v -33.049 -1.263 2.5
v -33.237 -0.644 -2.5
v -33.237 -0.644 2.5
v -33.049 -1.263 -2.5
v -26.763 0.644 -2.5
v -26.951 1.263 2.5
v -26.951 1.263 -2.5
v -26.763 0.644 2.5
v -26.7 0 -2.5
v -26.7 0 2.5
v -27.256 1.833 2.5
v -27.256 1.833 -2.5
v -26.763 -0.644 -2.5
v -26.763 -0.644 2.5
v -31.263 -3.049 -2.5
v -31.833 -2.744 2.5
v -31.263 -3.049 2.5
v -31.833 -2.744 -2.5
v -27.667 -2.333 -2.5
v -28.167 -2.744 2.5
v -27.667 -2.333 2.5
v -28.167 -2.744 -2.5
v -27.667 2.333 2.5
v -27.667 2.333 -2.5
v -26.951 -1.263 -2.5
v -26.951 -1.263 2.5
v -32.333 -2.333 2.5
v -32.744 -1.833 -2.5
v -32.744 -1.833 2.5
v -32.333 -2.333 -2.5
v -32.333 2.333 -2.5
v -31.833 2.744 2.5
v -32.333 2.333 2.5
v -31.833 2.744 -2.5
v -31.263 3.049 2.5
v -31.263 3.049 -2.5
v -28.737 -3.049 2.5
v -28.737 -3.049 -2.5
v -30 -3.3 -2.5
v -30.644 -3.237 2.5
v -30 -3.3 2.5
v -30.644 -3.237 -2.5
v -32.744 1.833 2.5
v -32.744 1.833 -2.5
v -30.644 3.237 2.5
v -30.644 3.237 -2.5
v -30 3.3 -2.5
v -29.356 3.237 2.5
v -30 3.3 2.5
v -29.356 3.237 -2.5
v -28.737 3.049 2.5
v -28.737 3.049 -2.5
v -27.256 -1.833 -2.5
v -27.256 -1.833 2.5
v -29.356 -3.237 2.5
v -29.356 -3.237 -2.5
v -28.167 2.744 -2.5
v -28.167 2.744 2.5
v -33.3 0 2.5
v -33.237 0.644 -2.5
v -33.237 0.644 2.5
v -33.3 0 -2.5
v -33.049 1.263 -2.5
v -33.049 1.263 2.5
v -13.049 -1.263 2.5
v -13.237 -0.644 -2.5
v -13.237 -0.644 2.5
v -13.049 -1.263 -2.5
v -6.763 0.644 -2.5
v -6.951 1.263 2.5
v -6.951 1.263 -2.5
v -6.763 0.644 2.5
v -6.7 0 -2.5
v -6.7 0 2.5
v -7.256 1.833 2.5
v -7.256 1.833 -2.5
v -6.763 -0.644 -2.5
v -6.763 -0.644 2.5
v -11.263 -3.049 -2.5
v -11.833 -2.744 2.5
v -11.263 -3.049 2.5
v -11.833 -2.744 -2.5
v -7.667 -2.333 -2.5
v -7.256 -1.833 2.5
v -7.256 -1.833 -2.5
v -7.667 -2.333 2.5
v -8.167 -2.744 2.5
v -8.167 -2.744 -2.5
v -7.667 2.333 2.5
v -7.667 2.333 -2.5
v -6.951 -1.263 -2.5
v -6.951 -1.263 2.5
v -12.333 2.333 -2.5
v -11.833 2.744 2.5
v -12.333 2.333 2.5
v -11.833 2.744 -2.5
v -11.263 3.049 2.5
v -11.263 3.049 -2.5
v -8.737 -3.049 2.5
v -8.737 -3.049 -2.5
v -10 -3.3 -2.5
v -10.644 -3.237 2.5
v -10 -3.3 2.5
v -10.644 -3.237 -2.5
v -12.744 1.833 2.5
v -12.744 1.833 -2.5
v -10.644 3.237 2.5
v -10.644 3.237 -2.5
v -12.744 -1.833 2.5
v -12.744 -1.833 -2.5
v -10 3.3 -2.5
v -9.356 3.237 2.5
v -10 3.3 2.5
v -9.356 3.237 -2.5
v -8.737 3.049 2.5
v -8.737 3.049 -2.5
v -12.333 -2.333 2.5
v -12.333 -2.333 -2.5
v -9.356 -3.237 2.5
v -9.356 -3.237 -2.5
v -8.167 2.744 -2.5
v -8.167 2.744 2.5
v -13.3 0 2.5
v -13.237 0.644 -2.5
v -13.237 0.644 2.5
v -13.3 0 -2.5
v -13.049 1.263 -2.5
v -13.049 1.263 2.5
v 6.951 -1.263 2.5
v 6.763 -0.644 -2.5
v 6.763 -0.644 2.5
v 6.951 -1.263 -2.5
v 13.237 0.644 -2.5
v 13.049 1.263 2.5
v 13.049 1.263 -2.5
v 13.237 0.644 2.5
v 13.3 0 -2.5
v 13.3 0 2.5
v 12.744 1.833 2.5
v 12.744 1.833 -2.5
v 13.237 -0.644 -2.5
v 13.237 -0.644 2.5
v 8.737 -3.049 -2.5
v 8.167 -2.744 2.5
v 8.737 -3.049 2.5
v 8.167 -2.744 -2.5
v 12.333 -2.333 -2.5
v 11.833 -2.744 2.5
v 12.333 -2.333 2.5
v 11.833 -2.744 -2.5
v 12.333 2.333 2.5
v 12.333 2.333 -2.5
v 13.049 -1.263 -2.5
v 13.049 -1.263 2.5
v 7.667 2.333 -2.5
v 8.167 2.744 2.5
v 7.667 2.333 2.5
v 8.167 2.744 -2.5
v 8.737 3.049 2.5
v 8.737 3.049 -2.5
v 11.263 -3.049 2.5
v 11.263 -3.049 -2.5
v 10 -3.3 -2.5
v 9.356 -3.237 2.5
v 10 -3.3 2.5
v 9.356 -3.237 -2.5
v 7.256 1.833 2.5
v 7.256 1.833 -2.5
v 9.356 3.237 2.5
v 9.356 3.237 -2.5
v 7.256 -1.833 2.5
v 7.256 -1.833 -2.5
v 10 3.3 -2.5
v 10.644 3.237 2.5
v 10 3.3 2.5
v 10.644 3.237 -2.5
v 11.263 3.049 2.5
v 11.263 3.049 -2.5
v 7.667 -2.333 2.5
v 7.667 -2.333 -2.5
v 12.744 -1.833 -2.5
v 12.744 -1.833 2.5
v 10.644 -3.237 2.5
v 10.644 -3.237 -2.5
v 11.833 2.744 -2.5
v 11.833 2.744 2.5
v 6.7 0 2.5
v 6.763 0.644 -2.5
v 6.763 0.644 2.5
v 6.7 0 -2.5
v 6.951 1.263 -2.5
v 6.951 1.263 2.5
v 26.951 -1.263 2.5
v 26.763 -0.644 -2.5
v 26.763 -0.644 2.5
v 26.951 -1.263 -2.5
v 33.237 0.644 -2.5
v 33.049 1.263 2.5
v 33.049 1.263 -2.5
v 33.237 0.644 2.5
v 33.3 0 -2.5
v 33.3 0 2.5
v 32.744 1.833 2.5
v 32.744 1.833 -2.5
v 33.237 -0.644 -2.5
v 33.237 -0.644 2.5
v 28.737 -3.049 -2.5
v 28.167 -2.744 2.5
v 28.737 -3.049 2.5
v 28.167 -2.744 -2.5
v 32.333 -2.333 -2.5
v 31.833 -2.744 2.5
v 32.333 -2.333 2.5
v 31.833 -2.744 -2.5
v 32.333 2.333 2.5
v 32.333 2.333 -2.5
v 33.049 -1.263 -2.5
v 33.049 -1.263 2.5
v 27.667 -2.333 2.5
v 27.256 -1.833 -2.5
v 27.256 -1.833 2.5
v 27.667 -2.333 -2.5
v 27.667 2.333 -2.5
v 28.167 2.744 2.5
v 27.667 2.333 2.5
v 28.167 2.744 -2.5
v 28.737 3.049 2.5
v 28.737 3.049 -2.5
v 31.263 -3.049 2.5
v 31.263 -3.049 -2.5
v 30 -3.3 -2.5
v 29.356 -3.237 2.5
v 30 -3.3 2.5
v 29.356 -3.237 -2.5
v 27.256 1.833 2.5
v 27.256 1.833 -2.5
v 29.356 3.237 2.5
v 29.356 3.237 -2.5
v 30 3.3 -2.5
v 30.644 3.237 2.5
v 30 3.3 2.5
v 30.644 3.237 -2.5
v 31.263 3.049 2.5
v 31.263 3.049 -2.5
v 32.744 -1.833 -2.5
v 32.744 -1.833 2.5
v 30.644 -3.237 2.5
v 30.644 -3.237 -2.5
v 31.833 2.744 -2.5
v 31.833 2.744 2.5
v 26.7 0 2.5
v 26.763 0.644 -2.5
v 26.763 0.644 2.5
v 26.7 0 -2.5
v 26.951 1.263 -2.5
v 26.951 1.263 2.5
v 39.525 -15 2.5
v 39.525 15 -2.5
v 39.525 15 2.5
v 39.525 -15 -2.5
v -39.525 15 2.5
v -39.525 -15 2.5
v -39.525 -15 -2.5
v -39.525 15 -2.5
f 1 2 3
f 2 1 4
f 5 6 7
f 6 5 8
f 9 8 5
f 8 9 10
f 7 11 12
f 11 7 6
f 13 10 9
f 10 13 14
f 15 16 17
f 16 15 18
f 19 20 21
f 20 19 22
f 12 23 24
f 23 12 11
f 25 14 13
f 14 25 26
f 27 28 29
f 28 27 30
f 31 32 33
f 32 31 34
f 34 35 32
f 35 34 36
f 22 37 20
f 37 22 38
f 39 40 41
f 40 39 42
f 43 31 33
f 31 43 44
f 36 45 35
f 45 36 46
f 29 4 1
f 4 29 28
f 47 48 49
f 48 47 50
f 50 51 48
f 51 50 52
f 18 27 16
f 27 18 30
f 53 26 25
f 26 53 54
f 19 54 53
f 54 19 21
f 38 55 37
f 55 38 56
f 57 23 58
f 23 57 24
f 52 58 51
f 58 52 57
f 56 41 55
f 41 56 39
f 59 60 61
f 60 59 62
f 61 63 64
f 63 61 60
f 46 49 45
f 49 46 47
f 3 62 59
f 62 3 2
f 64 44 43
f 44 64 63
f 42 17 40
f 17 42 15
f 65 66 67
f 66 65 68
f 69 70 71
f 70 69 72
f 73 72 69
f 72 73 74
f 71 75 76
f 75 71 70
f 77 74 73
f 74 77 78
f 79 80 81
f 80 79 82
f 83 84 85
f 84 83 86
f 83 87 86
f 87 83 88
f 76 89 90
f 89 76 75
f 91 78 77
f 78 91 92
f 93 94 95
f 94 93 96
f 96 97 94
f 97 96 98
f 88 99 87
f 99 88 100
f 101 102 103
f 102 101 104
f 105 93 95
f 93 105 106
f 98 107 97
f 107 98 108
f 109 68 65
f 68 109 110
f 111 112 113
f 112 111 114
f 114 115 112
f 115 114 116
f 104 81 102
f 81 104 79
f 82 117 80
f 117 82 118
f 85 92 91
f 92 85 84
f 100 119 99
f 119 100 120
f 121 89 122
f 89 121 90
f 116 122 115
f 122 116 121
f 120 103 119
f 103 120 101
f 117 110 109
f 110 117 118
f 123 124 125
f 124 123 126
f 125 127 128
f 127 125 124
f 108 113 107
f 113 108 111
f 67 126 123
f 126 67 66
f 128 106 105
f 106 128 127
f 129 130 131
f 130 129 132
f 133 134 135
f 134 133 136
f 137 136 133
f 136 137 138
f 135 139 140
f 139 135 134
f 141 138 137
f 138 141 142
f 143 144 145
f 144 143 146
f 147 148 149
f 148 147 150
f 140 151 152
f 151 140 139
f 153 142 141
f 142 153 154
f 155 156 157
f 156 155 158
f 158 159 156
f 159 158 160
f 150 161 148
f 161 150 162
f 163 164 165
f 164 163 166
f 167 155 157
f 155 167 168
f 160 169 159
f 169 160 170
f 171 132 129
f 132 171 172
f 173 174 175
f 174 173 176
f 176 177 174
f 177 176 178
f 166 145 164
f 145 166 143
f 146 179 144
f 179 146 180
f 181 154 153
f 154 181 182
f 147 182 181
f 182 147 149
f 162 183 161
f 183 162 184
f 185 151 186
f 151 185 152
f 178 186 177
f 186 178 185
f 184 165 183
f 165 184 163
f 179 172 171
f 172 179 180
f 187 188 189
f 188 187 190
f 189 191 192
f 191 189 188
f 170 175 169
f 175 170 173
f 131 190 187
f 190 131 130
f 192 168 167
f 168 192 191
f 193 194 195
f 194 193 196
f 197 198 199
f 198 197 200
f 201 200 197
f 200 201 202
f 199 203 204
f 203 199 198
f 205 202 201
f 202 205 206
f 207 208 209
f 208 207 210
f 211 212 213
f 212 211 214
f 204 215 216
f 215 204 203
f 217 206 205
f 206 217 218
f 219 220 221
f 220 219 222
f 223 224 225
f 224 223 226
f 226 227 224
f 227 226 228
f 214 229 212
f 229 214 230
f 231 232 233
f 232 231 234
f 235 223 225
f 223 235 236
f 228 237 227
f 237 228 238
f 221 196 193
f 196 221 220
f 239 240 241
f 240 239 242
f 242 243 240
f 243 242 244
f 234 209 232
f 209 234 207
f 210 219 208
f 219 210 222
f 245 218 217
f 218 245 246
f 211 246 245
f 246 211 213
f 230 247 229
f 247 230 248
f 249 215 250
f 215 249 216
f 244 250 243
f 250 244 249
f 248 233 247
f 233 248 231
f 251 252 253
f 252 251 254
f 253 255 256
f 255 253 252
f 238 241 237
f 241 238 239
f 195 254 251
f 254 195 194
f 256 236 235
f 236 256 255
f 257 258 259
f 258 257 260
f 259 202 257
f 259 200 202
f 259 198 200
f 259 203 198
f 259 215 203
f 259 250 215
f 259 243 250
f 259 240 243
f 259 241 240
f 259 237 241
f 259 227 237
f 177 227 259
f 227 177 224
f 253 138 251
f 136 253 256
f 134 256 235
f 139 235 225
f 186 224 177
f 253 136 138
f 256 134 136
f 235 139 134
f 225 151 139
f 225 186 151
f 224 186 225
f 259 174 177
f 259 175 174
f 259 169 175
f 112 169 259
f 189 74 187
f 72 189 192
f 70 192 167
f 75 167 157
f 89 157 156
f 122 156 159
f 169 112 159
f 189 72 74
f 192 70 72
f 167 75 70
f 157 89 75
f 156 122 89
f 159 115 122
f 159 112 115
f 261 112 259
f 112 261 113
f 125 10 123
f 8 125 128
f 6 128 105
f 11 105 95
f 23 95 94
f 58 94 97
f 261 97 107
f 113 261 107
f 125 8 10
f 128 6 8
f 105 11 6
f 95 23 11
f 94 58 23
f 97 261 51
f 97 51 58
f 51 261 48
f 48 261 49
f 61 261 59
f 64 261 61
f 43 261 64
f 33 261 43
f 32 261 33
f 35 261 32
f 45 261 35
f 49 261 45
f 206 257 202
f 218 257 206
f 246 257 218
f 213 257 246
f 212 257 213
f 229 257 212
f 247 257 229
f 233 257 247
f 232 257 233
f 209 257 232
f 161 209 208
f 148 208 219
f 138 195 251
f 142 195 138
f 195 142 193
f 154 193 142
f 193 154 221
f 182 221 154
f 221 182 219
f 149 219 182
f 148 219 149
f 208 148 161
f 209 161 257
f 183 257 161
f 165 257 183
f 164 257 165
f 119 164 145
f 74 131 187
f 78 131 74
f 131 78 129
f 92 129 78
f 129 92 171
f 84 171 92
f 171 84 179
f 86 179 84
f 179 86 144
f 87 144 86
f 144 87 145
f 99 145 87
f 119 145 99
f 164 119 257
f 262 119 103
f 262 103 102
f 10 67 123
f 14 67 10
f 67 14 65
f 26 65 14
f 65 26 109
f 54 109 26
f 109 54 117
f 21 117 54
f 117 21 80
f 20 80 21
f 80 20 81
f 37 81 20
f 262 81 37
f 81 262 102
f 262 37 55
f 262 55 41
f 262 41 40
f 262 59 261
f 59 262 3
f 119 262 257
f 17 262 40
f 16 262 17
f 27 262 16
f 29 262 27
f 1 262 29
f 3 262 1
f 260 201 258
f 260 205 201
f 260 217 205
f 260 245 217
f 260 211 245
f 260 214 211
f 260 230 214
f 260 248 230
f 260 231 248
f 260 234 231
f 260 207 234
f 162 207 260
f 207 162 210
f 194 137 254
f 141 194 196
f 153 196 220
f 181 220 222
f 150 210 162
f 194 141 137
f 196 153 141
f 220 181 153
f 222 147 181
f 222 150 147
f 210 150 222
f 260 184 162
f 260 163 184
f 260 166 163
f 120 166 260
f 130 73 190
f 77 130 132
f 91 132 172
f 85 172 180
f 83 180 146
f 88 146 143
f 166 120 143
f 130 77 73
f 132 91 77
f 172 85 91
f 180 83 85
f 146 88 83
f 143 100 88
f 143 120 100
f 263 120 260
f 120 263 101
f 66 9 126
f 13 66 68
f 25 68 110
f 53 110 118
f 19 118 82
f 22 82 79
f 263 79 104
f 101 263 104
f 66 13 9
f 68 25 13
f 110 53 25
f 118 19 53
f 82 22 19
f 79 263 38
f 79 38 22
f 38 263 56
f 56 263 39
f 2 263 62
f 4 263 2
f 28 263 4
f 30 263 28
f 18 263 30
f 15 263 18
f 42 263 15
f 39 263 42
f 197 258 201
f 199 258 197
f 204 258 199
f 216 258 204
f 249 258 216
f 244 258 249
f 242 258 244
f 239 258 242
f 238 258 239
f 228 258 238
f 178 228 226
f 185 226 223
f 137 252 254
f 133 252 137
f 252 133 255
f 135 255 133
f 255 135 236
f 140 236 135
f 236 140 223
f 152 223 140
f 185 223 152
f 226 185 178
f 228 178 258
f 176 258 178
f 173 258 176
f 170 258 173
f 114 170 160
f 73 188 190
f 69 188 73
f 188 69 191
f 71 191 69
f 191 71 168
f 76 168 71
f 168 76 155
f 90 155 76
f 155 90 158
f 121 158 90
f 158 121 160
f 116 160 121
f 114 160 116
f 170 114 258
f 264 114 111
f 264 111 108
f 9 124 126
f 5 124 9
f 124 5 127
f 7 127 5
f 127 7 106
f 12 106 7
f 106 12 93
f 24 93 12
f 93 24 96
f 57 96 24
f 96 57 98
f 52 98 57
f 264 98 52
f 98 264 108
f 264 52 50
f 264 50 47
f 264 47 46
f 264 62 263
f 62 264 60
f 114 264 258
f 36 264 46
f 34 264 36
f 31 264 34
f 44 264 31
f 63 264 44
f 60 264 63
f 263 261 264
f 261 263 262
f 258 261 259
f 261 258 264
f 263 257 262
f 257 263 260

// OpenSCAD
$fn = 32;

// ----------------------------------------------------------------------
// Hole bar, 4 x Ø6.6
// row layout, 9.525 mm edge offset
// ----------------------------------------------------------------------

// --- parameters (mm) ---
bar_w = 30;    // bar width (Y)
bar_t = 5;     // bar thickness (Z)
holes = 4;     // holes per row
hole_d = 6.6;  // hole diameter
edge = 9.525;  // offset from the bar end to the first hole
pitch = 20;    // pitch between neighbouring holes

// --- derived feature positions (mm) ---
span = (holes - 1) * pitch;   // = 60   distance between the end holes
bar_l = span + 2 * edge;      // = 79.05   overall bar length
start_x = -bar_l / 2 + edge;  // = -30   X of the first hole
feature_centers = [
  [start_x + 0 * pitch, 0],
  [start_x + 1 * pitch, 0],
  [start_x + 2 * pitch, 0],
  [start_x + 3 * pitch, 0]
];   // hole centres of the first row

// bar with one row of holes, drilled from feature_centers
difference() {
  translate([-bar_l / 2, -bar_w / 2, -bar_t / 2]) cube([bar_l, bar_w, bar_t]);
  for (centre = feature_centers)
    translate([centre[0], centre[1], 0])
      cylinder(d = hole_d, h = bar_t + 2, center = true);
}
